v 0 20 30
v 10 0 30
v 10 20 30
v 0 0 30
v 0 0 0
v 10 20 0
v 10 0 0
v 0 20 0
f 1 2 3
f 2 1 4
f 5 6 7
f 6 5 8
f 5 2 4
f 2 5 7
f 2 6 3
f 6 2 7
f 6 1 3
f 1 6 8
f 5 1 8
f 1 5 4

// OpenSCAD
let($fa=2.000000, $fn=0, $fs=0.150000) union() difference() { cube(size=[10.000000, 20.000000, 30.000000]); ; }
